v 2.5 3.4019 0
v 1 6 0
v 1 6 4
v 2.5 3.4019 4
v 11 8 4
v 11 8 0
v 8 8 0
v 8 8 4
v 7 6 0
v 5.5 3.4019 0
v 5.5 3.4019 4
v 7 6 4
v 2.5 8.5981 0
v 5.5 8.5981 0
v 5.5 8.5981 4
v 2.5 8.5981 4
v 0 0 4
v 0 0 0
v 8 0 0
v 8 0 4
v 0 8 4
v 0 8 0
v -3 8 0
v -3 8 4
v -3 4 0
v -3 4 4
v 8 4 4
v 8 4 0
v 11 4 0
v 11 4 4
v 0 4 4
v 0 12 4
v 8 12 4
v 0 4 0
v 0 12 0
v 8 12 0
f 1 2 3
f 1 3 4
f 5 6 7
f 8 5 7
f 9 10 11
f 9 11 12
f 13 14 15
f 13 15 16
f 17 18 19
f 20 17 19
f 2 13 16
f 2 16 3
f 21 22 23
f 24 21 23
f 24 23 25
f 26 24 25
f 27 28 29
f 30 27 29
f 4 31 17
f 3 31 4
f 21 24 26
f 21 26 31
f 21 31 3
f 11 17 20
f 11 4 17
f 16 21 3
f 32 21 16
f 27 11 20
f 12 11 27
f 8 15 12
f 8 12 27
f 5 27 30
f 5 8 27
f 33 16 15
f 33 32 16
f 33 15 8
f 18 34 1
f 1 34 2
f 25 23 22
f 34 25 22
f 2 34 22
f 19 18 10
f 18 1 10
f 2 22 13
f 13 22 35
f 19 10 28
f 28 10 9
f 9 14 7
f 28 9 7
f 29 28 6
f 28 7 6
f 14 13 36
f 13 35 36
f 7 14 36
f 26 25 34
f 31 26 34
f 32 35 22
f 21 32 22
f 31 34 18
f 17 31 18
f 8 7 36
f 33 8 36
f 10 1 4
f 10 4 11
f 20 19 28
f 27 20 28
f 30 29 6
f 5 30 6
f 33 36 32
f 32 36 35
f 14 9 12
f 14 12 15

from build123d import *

# Parameters (mm, degrees)
BOSS_EXTRUDE1_DEPTH = 4


with BuildPart() as part:
    # Sketch1 → Boss-Extrude1 (new body)
    with BuildSketch(Plane.XY):
        Polygon((0, 0), (8, 0), (8, 4), (11, 4), (11, 8), (8, 8), (8, 12), (0, 12), (0, 8), (-3, 8), (-3, 4), (0, 4), align=None)
        Polygon((7, 6), (5.5, 8.598076211), (2.5, 8.598076211), (1, 6), (2.5, 3.401923789), (5.5, 3.401923789), align=None, mode=Mode.SUBTRACT)
    extrude(amount=BOSS_EXTRUDE1_DEPTH)


solid = part.part
